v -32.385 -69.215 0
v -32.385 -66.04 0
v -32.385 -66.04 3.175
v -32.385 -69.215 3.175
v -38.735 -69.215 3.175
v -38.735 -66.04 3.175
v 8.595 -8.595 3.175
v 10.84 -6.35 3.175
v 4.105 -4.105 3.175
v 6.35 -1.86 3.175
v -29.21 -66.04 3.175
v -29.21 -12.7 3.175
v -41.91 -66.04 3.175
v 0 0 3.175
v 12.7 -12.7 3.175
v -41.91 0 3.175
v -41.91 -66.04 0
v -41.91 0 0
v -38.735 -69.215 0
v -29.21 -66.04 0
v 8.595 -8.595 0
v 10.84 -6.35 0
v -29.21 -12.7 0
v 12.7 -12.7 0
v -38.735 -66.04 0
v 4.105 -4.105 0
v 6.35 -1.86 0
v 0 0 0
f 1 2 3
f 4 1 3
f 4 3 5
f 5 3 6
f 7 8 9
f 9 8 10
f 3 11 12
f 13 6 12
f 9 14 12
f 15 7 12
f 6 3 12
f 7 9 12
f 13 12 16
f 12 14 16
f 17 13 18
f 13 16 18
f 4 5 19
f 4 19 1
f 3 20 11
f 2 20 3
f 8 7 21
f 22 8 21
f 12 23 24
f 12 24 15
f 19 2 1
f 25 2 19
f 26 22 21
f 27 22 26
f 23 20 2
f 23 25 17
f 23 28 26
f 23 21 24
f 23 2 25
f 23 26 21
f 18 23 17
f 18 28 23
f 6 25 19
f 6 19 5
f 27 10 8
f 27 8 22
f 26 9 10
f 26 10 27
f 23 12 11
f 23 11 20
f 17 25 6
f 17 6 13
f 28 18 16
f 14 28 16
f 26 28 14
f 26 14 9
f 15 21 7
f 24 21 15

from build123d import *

# Parameters (mm, degrees)
SKETCH1_W           = 12.7
SKETCH1_H           = 12.7
BOSS_EXTRUDE1_DEPTH = 3.175
CUT_EXTRUDE1_DEPTH  = 4.175
SKETCH4_W           = 3.175
SKETCH4_H           = 6.35
BOSS_EXTRUDE3_DEPTH = 3.175
SKETCH5_W           = 3.175
SKETCH5_H           = 12.7
BOSS_EXTRUDE4_DEPTH = 41.91
SKETCH6_W           = 12.7
SKETCH6_H           = 3.175
BOSS_EXTRUDE5_DEPTH = 53.34
SKETCH7_W           = 6.35
SKETCH7_H           = 3.175
BOSS_EXTRUDE6_DEPTH = 3.175


with BuildPart() as part:
    # Sketch1 → Boss-Extrude1 (new body)
    with BuildSketch(Plane.XY):
        with Locations((6.35, -6.35)):
            Rectangle(SKETCH1_W, SKETCH1_H)
    extrude(amount=BOSS_EXTRUDE1_DEPTH)

    # Sketch3 → Cut-Extrude1 (cut, through all)
    with BuildSketch(Plane(origin=(0, 0, 0), x_dir=(-1, 0, 0), z_dir=(0, 0, -1))):
        Polygon((0, 0), (-12.7, -12.7), (-12.7, 0), align=None)
    extrude(amount=-CUT_EXTRUDE1_DEPTH, mode=Mode.SUBTRACT)

    # Sketch4 → Boss-Extrude3 (add)
    with BuildSketch(Plane(origin=(0, 0, 0), x_dir=(0, 0, -1), z_dir=(0.707106781, 0.707106781, 0))):
        with Locations((-1.5875, -8.980256121)):
            Rectangle(SKETCH4_W, SKETCH4_H)
    extrude(amount=BOSS_EXTRUDE3_DEPTH)

    # Sketch5 → Boss-Extrude4 (add)
    with BuildSketch(Plane.ZY):
        with Locations((1.5875, -6.35)):
            Rectangle(SKETCH5_W, SKETCH5_H)
    extrude(amount=BOSS_EXTRUDE4_DEPTH)

    # Sketch6 → Boss-Extrude5 (add)
    with BuildSketch(Plane(origin=(0, -12.7, 0), x_dir=(-1, 0, 0), z_dir=(0, -1, 0))):
        with Locations((35.56, -1.5875)):
            Rectangle(SKETCH6_W, SKETCH6_H)
    extrude(amount=BOSS_EXTRUDE5_DEPTH)

    # Sketch7 → Boss-Extrude6 (add)
    with BuildSketch(Plane.XZ.offset(66.04)):
        with Locations((-35.56, 1.5875)):
            Rectangle(SKETCH7_W, SKETCH7_H)
    extrude(amount=BOSS_EXTRUDE6_DEPTH)


solid = part.part
